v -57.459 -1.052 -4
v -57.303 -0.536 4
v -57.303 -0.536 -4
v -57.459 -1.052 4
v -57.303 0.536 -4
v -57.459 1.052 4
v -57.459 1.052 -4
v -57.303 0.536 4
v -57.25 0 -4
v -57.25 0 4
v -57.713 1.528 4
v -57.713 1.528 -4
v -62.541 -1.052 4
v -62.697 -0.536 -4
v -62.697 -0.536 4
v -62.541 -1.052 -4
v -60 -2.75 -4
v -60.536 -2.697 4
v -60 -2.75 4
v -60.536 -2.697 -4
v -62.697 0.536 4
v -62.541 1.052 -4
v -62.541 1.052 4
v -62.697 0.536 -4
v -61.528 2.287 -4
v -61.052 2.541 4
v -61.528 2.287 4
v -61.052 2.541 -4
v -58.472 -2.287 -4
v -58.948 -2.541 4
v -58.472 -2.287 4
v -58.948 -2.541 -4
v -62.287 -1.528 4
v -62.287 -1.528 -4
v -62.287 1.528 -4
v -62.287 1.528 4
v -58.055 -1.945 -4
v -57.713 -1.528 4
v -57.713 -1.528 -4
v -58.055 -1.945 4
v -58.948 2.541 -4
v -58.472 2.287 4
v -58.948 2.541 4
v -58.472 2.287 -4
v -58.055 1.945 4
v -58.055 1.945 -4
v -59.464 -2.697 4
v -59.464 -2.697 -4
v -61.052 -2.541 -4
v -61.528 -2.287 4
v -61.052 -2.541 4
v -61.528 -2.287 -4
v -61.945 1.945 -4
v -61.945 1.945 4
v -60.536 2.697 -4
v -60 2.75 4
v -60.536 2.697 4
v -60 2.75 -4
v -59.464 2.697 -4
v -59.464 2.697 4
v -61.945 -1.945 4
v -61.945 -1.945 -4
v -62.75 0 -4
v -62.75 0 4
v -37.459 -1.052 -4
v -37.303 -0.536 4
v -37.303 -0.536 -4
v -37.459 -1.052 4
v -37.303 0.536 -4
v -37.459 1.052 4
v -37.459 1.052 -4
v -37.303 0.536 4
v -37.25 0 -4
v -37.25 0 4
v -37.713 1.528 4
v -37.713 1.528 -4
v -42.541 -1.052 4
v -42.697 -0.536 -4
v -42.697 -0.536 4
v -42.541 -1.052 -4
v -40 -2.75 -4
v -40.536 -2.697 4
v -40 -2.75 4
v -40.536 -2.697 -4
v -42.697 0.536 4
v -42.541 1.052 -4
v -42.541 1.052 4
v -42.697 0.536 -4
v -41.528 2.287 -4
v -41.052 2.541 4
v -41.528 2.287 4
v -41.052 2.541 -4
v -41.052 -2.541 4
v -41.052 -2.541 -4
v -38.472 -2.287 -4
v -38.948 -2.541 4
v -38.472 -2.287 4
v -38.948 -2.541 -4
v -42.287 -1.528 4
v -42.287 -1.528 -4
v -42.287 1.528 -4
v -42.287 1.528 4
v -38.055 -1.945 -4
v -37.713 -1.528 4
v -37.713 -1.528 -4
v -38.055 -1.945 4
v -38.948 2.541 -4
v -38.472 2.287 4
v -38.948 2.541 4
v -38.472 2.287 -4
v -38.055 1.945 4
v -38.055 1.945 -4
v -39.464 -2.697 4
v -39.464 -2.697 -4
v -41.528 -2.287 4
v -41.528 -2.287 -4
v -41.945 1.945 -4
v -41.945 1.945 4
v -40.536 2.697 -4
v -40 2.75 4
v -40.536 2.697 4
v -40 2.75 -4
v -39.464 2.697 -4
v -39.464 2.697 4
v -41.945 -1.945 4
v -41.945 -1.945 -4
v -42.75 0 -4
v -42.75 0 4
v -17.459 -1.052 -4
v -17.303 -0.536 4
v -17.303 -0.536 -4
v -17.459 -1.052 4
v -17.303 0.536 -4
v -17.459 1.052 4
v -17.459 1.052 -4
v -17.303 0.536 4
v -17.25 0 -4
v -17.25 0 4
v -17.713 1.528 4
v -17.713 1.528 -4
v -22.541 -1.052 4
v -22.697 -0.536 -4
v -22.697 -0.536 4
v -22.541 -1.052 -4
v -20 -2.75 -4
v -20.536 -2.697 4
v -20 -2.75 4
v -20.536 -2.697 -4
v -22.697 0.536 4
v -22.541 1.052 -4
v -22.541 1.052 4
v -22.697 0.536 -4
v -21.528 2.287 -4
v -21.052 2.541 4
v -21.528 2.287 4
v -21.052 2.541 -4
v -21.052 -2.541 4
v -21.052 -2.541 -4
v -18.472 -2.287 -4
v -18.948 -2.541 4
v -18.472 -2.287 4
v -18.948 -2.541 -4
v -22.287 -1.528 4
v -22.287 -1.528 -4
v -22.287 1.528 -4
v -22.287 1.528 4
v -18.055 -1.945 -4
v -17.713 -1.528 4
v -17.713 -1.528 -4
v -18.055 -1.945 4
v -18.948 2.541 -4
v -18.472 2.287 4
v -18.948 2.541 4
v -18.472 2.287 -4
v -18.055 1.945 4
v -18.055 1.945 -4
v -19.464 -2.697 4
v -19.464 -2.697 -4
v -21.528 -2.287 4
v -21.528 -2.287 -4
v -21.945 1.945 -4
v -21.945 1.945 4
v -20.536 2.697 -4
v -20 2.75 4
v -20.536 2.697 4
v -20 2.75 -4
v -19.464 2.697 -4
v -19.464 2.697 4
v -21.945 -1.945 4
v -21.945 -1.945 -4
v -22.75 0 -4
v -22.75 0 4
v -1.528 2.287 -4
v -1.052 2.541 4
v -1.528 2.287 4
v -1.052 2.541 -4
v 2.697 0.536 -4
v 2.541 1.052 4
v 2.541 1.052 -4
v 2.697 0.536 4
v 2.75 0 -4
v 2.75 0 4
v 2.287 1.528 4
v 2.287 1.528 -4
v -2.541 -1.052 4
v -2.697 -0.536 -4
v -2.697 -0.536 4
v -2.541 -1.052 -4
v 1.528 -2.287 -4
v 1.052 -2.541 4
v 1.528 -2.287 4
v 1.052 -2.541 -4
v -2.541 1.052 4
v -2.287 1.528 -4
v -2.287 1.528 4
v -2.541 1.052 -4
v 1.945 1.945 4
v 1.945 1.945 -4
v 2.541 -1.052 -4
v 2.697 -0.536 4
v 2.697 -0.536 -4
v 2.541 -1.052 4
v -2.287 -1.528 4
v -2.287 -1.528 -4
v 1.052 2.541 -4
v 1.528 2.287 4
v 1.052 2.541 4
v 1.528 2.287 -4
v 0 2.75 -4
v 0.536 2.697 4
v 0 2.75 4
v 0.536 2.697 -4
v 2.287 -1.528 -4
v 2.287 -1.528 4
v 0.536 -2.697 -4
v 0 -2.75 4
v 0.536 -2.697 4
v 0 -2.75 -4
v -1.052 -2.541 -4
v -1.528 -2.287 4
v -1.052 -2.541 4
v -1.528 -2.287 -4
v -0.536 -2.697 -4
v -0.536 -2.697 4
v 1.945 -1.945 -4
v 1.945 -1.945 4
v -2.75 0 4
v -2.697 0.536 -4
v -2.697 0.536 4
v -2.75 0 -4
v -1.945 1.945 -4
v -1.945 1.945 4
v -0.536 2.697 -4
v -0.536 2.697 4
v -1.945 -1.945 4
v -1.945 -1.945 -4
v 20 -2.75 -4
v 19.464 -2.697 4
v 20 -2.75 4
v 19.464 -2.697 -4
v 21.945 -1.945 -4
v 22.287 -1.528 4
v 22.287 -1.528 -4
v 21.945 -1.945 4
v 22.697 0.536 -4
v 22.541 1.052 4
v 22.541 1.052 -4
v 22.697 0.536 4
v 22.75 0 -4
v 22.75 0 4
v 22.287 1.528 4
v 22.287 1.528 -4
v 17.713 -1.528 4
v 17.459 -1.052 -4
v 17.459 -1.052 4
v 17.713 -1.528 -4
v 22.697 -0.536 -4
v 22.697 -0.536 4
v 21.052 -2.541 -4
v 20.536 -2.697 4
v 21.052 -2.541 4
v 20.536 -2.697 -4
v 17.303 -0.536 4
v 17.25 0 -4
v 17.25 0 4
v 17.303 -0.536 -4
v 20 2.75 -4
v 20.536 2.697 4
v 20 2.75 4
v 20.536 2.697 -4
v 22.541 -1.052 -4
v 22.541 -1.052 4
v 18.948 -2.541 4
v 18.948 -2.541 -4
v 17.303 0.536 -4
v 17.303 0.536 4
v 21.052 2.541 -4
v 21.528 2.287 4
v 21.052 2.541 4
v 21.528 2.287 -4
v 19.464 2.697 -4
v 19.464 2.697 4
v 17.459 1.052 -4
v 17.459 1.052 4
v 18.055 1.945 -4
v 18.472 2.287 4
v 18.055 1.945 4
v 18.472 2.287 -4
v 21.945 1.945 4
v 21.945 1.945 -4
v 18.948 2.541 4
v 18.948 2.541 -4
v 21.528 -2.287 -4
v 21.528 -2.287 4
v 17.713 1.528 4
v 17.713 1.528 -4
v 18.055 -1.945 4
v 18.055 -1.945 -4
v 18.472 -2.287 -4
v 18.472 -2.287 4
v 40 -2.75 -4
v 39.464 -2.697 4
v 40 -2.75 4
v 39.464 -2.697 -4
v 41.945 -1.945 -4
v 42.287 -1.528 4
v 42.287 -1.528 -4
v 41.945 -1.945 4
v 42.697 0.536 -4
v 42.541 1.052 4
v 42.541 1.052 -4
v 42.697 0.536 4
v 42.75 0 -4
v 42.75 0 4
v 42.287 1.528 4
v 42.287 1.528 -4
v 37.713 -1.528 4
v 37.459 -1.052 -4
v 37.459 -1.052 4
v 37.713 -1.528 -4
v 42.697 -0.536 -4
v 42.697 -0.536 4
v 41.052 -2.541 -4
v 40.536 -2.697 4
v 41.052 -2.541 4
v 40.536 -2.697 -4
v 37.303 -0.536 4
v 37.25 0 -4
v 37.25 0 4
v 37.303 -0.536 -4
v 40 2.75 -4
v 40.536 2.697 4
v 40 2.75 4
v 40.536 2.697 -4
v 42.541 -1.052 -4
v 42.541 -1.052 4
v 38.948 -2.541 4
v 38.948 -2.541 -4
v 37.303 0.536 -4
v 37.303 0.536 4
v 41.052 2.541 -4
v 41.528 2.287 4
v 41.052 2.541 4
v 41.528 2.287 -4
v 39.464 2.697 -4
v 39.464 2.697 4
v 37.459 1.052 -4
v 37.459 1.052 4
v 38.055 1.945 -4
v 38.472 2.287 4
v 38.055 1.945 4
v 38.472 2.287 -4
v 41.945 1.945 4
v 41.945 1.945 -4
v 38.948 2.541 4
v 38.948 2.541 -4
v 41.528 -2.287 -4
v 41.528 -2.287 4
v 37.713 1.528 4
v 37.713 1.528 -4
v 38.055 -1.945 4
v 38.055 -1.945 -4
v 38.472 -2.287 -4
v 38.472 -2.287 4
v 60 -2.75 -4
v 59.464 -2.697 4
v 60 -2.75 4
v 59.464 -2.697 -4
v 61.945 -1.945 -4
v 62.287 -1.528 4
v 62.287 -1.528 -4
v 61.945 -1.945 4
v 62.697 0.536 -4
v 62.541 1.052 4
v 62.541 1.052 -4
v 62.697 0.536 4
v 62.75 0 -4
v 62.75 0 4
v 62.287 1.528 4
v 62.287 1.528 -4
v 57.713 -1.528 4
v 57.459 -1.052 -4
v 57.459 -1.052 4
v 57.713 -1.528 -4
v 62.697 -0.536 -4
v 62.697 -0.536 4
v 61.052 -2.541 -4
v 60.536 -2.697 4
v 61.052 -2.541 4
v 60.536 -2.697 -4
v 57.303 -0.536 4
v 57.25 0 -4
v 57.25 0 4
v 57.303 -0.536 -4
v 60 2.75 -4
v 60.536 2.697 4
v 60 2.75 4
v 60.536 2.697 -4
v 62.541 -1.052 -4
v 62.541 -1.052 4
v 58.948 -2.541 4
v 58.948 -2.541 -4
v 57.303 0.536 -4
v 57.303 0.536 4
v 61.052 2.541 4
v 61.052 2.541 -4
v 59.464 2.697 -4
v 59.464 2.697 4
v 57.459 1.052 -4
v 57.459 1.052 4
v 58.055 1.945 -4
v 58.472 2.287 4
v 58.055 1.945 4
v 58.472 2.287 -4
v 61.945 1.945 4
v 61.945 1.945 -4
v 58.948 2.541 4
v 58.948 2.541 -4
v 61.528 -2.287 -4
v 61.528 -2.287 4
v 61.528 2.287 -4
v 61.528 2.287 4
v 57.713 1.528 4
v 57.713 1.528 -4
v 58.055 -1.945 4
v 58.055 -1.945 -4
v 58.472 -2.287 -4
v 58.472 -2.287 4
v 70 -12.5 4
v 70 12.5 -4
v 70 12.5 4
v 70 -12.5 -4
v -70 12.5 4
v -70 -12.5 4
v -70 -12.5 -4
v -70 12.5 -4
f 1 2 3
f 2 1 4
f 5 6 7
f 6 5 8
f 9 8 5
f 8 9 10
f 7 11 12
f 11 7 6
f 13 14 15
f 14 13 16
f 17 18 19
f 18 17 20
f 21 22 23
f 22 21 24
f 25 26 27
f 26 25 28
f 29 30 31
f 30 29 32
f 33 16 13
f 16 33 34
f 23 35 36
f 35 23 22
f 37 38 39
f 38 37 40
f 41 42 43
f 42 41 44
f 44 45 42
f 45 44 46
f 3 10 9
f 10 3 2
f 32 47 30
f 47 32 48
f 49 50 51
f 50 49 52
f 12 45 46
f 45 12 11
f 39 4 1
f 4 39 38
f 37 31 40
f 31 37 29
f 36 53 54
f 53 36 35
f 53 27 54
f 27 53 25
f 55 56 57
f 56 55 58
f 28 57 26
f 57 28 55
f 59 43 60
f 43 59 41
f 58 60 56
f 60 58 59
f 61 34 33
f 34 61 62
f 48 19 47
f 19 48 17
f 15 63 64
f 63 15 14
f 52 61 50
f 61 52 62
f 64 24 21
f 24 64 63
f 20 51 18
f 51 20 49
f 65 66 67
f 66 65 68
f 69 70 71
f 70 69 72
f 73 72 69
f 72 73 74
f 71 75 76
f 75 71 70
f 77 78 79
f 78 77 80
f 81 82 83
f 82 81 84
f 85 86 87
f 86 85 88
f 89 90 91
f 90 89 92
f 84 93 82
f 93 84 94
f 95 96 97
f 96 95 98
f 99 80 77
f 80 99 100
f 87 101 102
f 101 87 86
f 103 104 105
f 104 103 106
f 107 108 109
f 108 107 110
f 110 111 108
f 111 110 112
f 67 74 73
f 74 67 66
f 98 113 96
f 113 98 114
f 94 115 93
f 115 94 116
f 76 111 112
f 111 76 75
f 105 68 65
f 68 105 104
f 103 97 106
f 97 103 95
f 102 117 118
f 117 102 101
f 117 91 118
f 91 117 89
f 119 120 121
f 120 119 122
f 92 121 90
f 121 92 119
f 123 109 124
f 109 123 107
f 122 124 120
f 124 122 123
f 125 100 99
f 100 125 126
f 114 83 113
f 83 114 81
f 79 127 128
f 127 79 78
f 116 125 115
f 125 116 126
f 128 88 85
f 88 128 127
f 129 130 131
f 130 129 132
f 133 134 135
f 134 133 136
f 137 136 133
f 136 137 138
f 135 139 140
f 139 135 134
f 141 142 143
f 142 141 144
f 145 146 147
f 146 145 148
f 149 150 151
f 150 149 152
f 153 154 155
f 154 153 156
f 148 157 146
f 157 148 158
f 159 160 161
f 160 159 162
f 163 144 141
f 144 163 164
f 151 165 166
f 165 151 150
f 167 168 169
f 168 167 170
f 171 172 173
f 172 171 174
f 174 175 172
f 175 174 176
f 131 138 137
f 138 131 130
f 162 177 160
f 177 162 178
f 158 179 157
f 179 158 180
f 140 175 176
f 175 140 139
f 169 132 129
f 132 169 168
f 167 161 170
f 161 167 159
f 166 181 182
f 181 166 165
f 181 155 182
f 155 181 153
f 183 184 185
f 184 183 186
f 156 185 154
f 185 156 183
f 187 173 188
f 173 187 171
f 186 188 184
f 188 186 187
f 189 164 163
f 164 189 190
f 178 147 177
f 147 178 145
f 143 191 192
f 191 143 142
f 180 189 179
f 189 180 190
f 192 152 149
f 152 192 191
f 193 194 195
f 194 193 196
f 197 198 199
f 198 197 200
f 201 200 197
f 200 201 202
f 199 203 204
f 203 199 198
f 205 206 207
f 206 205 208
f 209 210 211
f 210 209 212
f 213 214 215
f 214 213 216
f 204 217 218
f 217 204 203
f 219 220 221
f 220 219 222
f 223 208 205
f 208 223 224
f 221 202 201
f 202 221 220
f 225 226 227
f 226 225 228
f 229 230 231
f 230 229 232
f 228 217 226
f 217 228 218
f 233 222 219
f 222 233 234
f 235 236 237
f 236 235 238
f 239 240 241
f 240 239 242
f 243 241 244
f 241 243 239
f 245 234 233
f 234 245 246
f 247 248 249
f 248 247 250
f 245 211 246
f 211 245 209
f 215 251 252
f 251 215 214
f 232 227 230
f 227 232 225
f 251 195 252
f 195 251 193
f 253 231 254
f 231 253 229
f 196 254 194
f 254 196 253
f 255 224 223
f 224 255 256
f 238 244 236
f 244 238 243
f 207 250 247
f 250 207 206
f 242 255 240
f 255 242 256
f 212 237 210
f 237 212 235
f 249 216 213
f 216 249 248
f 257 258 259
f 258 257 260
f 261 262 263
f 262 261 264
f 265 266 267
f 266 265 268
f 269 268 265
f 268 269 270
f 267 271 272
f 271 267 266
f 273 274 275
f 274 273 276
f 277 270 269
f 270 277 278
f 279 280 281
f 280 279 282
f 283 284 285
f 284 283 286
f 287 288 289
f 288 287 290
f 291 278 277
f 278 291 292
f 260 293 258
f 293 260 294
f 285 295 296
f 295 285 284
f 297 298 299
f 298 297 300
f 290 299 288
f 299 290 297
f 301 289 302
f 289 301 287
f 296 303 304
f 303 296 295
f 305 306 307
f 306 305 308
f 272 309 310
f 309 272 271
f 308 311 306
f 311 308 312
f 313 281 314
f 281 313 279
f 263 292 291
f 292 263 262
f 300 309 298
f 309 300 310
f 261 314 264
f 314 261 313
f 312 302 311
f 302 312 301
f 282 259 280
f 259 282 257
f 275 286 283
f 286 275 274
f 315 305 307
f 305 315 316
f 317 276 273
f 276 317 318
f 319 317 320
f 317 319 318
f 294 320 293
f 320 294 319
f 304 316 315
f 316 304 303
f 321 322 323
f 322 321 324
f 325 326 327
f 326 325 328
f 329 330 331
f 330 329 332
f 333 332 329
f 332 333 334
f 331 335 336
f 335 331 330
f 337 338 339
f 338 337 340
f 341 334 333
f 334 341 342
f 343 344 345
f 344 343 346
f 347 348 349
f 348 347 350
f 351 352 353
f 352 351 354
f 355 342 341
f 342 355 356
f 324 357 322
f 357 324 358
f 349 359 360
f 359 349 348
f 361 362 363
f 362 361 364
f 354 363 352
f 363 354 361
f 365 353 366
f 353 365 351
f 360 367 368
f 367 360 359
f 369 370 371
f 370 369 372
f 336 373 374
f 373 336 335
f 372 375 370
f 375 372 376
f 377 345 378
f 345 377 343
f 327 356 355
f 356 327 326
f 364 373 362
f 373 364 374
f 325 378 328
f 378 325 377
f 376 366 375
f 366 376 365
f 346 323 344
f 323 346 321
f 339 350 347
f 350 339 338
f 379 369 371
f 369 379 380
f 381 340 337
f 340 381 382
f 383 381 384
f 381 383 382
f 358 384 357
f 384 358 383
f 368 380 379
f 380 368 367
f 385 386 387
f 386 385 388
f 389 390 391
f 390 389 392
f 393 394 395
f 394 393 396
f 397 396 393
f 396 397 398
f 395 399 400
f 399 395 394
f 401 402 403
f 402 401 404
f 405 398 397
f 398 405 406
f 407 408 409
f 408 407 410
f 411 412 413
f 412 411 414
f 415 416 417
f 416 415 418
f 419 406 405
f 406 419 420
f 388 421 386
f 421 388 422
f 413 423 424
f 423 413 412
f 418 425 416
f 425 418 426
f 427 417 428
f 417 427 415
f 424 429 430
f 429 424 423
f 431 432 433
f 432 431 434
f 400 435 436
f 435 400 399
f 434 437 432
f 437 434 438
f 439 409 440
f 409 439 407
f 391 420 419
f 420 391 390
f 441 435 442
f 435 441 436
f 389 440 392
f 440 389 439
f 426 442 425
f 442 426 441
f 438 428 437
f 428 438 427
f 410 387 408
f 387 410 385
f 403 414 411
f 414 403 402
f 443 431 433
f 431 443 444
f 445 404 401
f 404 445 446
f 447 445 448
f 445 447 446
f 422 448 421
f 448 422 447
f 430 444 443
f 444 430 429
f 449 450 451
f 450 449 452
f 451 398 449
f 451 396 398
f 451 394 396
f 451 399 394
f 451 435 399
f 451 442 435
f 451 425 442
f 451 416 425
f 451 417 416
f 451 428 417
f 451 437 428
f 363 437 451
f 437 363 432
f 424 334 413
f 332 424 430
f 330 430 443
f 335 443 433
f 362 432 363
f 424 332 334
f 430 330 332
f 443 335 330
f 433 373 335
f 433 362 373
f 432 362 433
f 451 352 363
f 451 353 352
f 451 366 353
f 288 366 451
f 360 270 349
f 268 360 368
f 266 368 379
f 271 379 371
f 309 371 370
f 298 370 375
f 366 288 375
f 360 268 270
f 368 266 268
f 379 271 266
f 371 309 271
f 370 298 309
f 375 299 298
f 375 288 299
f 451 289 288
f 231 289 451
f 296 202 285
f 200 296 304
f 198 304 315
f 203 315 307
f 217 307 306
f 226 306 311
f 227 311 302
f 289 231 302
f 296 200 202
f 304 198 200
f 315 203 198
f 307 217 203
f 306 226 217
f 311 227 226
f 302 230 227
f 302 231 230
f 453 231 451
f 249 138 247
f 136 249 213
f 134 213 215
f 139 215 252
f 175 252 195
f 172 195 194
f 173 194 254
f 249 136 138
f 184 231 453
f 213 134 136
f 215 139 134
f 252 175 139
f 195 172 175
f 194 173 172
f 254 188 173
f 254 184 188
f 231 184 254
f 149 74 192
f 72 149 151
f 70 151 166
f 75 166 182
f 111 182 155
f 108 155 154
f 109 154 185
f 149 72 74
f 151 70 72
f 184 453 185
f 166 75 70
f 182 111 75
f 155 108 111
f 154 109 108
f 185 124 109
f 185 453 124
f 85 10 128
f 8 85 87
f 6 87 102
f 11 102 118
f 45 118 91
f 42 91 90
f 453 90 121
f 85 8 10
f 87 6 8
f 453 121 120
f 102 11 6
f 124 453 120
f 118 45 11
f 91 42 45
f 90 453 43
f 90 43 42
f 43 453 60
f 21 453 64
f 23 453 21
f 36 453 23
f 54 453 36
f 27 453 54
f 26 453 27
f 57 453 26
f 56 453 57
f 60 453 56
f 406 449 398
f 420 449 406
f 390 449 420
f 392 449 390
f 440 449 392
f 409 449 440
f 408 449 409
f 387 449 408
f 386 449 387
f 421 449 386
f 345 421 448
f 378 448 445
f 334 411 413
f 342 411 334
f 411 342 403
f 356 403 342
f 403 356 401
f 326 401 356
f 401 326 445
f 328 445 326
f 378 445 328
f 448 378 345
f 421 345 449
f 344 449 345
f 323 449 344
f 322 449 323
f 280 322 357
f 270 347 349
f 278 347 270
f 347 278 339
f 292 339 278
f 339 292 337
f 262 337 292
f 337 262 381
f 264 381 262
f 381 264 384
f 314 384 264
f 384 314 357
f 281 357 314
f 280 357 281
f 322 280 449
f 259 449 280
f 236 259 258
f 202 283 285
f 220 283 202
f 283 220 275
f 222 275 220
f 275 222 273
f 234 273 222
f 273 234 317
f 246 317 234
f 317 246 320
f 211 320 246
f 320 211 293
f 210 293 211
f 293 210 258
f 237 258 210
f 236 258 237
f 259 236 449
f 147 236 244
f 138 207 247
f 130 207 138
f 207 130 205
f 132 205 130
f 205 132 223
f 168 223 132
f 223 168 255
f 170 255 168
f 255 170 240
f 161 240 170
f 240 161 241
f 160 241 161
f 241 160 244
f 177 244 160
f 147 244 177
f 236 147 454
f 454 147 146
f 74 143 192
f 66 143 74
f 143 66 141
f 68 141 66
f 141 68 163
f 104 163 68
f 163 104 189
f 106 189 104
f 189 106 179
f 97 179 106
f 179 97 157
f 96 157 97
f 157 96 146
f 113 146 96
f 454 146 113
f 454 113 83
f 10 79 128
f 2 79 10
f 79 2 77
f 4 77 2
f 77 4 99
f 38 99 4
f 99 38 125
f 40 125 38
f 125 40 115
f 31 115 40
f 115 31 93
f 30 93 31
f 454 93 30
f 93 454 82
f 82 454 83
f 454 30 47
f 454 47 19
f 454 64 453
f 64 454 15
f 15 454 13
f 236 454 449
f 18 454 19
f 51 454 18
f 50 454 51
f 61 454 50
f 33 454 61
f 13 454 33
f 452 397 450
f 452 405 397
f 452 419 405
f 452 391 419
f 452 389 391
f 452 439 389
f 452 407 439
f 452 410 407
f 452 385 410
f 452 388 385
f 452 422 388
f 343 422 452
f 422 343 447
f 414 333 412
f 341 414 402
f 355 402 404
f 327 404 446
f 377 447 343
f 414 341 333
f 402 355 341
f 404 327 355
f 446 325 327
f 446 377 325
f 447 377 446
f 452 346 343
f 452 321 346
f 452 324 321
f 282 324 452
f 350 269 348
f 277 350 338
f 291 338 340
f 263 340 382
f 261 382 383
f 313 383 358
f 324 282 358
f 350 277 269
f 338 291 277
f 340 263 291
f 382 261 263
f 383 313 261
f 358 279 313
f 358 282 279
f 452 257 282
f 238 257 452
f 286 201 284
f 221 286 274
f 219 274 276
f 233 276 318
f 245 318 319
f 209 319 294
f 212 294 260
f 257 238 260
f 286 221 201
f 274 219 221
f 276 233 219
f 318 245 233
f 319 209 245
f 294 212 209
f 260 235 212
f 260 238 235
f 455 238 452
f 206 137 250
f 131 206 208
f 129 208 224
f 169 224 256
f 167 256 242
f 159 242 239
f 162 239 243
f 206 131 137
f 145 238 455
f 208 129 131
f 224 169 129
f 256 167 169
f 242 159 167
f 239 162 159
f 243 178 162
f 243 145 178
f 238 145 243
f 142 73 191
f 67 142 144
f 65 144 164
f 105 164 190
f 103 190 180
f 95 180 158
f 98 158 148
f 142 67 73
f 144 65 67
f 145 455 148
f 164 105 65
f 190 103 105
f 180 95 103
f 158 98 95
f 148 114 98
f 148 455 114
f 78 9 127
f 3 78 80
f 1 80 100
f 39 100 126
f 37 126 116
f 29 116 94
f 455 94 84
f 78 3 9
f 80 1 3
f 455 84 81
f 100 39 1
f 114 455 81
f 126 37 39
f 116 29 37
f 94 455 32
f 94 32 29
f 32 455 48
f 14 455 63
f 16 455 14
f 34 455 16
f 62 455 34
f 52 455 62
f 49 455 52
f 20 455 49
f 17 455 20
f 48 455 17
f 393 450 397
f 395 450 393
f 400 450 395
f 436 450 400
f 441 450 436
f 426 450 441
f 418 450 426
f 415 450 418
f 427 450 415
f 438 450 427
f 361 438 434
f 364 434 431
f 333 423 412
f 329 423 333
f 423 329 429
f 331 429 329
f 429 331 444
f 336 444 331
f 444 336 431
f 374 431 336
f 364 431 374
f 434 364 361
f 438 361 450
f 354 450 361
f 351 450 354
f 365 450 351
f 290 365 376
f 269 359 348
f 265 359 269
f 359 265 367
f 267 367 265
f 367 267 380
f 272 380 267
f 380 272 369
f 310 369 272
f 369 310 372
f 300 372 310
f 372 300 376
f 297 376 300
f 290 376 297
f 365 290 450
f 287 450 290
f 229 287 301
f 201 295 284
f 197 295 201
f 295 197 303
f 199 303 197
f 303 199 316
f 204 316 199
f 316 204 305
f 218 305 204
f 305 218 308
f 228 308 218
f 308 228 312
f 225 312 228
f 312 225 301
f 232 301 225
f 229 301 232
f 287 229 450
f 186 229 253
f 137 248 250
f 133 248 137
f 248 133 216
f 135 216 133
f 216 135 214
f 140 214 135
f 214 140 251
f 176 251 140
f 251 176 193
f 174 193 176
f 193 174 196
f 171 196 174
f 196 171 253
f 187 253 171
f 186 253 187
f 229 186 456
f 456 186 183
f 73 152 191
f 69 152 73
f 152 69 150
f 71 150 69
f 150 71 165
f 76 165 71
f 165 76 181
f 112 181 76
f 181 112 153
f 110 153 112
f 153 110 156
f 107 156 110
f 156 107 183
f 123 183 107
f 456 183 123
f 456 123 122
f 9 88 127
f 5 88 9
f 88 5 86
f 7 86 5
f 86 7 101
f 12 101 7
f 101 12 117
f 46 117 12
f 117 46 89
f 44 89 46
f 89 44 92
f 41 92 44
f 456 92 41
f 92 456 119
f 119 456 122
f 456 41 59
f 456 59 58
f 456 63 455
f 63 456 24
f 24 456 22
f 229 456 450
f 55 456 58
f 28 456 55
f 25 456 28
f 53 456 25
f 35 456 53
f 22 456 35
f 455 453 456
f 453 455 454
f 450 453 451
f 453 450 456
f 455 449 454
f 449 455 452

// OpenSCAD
$fn = 32;

// ----------------------------------------------------------------------
// Hole bar, 7 x Ø5.5
// row layout, 10 mm edge offset
// ----------------------------------------------------------------------

// --- parameters (mm) ---
bar_w = 25;    // bar width (Y)
bar_t = 8;     // bar thickness (Z)
holes = 7;     // holes per row
hole_d = 5.5;  // hole diameter
edge = 10;     // offset from the bar end to the first hole
pitch = 20;    // pitch between neighbouring holes

// --- derived feature positions (mm) ---
span = (holes - 1) * pitch;   // = 120   distance between the end holes
bar_l = span + 2 * edge;      // = 140   overall bar length
start_x = -bar_l / 2 + edge;  // = -60   X of the first hole
feature_centers = [
  [start_x + 0 * pitch, 0],
  [start_x + 1 * pitch, 0],
  [start_x + 2 * pitch, 0],
  [start_x + 3 * pitch, 0],
  [start_x + 4 * pitch, 0],
  [start_x + 5 * pitch, 0],
  [start_x + 6 * pitch, 0]
];   // hole centres of the first row

// bar with one row of holes, drilled from feature_centers
difference() {
  translate([-bar_l / 2, -bar_w / 2, -bar_t / 2]) cube([bar_l, bar_w, bar_t]);
  for (centre = feature_centers)
    translate([centre[0], centre[1], 0])
      cylinder(d = hole_d, h = bar_t + 2, center = true);
}
